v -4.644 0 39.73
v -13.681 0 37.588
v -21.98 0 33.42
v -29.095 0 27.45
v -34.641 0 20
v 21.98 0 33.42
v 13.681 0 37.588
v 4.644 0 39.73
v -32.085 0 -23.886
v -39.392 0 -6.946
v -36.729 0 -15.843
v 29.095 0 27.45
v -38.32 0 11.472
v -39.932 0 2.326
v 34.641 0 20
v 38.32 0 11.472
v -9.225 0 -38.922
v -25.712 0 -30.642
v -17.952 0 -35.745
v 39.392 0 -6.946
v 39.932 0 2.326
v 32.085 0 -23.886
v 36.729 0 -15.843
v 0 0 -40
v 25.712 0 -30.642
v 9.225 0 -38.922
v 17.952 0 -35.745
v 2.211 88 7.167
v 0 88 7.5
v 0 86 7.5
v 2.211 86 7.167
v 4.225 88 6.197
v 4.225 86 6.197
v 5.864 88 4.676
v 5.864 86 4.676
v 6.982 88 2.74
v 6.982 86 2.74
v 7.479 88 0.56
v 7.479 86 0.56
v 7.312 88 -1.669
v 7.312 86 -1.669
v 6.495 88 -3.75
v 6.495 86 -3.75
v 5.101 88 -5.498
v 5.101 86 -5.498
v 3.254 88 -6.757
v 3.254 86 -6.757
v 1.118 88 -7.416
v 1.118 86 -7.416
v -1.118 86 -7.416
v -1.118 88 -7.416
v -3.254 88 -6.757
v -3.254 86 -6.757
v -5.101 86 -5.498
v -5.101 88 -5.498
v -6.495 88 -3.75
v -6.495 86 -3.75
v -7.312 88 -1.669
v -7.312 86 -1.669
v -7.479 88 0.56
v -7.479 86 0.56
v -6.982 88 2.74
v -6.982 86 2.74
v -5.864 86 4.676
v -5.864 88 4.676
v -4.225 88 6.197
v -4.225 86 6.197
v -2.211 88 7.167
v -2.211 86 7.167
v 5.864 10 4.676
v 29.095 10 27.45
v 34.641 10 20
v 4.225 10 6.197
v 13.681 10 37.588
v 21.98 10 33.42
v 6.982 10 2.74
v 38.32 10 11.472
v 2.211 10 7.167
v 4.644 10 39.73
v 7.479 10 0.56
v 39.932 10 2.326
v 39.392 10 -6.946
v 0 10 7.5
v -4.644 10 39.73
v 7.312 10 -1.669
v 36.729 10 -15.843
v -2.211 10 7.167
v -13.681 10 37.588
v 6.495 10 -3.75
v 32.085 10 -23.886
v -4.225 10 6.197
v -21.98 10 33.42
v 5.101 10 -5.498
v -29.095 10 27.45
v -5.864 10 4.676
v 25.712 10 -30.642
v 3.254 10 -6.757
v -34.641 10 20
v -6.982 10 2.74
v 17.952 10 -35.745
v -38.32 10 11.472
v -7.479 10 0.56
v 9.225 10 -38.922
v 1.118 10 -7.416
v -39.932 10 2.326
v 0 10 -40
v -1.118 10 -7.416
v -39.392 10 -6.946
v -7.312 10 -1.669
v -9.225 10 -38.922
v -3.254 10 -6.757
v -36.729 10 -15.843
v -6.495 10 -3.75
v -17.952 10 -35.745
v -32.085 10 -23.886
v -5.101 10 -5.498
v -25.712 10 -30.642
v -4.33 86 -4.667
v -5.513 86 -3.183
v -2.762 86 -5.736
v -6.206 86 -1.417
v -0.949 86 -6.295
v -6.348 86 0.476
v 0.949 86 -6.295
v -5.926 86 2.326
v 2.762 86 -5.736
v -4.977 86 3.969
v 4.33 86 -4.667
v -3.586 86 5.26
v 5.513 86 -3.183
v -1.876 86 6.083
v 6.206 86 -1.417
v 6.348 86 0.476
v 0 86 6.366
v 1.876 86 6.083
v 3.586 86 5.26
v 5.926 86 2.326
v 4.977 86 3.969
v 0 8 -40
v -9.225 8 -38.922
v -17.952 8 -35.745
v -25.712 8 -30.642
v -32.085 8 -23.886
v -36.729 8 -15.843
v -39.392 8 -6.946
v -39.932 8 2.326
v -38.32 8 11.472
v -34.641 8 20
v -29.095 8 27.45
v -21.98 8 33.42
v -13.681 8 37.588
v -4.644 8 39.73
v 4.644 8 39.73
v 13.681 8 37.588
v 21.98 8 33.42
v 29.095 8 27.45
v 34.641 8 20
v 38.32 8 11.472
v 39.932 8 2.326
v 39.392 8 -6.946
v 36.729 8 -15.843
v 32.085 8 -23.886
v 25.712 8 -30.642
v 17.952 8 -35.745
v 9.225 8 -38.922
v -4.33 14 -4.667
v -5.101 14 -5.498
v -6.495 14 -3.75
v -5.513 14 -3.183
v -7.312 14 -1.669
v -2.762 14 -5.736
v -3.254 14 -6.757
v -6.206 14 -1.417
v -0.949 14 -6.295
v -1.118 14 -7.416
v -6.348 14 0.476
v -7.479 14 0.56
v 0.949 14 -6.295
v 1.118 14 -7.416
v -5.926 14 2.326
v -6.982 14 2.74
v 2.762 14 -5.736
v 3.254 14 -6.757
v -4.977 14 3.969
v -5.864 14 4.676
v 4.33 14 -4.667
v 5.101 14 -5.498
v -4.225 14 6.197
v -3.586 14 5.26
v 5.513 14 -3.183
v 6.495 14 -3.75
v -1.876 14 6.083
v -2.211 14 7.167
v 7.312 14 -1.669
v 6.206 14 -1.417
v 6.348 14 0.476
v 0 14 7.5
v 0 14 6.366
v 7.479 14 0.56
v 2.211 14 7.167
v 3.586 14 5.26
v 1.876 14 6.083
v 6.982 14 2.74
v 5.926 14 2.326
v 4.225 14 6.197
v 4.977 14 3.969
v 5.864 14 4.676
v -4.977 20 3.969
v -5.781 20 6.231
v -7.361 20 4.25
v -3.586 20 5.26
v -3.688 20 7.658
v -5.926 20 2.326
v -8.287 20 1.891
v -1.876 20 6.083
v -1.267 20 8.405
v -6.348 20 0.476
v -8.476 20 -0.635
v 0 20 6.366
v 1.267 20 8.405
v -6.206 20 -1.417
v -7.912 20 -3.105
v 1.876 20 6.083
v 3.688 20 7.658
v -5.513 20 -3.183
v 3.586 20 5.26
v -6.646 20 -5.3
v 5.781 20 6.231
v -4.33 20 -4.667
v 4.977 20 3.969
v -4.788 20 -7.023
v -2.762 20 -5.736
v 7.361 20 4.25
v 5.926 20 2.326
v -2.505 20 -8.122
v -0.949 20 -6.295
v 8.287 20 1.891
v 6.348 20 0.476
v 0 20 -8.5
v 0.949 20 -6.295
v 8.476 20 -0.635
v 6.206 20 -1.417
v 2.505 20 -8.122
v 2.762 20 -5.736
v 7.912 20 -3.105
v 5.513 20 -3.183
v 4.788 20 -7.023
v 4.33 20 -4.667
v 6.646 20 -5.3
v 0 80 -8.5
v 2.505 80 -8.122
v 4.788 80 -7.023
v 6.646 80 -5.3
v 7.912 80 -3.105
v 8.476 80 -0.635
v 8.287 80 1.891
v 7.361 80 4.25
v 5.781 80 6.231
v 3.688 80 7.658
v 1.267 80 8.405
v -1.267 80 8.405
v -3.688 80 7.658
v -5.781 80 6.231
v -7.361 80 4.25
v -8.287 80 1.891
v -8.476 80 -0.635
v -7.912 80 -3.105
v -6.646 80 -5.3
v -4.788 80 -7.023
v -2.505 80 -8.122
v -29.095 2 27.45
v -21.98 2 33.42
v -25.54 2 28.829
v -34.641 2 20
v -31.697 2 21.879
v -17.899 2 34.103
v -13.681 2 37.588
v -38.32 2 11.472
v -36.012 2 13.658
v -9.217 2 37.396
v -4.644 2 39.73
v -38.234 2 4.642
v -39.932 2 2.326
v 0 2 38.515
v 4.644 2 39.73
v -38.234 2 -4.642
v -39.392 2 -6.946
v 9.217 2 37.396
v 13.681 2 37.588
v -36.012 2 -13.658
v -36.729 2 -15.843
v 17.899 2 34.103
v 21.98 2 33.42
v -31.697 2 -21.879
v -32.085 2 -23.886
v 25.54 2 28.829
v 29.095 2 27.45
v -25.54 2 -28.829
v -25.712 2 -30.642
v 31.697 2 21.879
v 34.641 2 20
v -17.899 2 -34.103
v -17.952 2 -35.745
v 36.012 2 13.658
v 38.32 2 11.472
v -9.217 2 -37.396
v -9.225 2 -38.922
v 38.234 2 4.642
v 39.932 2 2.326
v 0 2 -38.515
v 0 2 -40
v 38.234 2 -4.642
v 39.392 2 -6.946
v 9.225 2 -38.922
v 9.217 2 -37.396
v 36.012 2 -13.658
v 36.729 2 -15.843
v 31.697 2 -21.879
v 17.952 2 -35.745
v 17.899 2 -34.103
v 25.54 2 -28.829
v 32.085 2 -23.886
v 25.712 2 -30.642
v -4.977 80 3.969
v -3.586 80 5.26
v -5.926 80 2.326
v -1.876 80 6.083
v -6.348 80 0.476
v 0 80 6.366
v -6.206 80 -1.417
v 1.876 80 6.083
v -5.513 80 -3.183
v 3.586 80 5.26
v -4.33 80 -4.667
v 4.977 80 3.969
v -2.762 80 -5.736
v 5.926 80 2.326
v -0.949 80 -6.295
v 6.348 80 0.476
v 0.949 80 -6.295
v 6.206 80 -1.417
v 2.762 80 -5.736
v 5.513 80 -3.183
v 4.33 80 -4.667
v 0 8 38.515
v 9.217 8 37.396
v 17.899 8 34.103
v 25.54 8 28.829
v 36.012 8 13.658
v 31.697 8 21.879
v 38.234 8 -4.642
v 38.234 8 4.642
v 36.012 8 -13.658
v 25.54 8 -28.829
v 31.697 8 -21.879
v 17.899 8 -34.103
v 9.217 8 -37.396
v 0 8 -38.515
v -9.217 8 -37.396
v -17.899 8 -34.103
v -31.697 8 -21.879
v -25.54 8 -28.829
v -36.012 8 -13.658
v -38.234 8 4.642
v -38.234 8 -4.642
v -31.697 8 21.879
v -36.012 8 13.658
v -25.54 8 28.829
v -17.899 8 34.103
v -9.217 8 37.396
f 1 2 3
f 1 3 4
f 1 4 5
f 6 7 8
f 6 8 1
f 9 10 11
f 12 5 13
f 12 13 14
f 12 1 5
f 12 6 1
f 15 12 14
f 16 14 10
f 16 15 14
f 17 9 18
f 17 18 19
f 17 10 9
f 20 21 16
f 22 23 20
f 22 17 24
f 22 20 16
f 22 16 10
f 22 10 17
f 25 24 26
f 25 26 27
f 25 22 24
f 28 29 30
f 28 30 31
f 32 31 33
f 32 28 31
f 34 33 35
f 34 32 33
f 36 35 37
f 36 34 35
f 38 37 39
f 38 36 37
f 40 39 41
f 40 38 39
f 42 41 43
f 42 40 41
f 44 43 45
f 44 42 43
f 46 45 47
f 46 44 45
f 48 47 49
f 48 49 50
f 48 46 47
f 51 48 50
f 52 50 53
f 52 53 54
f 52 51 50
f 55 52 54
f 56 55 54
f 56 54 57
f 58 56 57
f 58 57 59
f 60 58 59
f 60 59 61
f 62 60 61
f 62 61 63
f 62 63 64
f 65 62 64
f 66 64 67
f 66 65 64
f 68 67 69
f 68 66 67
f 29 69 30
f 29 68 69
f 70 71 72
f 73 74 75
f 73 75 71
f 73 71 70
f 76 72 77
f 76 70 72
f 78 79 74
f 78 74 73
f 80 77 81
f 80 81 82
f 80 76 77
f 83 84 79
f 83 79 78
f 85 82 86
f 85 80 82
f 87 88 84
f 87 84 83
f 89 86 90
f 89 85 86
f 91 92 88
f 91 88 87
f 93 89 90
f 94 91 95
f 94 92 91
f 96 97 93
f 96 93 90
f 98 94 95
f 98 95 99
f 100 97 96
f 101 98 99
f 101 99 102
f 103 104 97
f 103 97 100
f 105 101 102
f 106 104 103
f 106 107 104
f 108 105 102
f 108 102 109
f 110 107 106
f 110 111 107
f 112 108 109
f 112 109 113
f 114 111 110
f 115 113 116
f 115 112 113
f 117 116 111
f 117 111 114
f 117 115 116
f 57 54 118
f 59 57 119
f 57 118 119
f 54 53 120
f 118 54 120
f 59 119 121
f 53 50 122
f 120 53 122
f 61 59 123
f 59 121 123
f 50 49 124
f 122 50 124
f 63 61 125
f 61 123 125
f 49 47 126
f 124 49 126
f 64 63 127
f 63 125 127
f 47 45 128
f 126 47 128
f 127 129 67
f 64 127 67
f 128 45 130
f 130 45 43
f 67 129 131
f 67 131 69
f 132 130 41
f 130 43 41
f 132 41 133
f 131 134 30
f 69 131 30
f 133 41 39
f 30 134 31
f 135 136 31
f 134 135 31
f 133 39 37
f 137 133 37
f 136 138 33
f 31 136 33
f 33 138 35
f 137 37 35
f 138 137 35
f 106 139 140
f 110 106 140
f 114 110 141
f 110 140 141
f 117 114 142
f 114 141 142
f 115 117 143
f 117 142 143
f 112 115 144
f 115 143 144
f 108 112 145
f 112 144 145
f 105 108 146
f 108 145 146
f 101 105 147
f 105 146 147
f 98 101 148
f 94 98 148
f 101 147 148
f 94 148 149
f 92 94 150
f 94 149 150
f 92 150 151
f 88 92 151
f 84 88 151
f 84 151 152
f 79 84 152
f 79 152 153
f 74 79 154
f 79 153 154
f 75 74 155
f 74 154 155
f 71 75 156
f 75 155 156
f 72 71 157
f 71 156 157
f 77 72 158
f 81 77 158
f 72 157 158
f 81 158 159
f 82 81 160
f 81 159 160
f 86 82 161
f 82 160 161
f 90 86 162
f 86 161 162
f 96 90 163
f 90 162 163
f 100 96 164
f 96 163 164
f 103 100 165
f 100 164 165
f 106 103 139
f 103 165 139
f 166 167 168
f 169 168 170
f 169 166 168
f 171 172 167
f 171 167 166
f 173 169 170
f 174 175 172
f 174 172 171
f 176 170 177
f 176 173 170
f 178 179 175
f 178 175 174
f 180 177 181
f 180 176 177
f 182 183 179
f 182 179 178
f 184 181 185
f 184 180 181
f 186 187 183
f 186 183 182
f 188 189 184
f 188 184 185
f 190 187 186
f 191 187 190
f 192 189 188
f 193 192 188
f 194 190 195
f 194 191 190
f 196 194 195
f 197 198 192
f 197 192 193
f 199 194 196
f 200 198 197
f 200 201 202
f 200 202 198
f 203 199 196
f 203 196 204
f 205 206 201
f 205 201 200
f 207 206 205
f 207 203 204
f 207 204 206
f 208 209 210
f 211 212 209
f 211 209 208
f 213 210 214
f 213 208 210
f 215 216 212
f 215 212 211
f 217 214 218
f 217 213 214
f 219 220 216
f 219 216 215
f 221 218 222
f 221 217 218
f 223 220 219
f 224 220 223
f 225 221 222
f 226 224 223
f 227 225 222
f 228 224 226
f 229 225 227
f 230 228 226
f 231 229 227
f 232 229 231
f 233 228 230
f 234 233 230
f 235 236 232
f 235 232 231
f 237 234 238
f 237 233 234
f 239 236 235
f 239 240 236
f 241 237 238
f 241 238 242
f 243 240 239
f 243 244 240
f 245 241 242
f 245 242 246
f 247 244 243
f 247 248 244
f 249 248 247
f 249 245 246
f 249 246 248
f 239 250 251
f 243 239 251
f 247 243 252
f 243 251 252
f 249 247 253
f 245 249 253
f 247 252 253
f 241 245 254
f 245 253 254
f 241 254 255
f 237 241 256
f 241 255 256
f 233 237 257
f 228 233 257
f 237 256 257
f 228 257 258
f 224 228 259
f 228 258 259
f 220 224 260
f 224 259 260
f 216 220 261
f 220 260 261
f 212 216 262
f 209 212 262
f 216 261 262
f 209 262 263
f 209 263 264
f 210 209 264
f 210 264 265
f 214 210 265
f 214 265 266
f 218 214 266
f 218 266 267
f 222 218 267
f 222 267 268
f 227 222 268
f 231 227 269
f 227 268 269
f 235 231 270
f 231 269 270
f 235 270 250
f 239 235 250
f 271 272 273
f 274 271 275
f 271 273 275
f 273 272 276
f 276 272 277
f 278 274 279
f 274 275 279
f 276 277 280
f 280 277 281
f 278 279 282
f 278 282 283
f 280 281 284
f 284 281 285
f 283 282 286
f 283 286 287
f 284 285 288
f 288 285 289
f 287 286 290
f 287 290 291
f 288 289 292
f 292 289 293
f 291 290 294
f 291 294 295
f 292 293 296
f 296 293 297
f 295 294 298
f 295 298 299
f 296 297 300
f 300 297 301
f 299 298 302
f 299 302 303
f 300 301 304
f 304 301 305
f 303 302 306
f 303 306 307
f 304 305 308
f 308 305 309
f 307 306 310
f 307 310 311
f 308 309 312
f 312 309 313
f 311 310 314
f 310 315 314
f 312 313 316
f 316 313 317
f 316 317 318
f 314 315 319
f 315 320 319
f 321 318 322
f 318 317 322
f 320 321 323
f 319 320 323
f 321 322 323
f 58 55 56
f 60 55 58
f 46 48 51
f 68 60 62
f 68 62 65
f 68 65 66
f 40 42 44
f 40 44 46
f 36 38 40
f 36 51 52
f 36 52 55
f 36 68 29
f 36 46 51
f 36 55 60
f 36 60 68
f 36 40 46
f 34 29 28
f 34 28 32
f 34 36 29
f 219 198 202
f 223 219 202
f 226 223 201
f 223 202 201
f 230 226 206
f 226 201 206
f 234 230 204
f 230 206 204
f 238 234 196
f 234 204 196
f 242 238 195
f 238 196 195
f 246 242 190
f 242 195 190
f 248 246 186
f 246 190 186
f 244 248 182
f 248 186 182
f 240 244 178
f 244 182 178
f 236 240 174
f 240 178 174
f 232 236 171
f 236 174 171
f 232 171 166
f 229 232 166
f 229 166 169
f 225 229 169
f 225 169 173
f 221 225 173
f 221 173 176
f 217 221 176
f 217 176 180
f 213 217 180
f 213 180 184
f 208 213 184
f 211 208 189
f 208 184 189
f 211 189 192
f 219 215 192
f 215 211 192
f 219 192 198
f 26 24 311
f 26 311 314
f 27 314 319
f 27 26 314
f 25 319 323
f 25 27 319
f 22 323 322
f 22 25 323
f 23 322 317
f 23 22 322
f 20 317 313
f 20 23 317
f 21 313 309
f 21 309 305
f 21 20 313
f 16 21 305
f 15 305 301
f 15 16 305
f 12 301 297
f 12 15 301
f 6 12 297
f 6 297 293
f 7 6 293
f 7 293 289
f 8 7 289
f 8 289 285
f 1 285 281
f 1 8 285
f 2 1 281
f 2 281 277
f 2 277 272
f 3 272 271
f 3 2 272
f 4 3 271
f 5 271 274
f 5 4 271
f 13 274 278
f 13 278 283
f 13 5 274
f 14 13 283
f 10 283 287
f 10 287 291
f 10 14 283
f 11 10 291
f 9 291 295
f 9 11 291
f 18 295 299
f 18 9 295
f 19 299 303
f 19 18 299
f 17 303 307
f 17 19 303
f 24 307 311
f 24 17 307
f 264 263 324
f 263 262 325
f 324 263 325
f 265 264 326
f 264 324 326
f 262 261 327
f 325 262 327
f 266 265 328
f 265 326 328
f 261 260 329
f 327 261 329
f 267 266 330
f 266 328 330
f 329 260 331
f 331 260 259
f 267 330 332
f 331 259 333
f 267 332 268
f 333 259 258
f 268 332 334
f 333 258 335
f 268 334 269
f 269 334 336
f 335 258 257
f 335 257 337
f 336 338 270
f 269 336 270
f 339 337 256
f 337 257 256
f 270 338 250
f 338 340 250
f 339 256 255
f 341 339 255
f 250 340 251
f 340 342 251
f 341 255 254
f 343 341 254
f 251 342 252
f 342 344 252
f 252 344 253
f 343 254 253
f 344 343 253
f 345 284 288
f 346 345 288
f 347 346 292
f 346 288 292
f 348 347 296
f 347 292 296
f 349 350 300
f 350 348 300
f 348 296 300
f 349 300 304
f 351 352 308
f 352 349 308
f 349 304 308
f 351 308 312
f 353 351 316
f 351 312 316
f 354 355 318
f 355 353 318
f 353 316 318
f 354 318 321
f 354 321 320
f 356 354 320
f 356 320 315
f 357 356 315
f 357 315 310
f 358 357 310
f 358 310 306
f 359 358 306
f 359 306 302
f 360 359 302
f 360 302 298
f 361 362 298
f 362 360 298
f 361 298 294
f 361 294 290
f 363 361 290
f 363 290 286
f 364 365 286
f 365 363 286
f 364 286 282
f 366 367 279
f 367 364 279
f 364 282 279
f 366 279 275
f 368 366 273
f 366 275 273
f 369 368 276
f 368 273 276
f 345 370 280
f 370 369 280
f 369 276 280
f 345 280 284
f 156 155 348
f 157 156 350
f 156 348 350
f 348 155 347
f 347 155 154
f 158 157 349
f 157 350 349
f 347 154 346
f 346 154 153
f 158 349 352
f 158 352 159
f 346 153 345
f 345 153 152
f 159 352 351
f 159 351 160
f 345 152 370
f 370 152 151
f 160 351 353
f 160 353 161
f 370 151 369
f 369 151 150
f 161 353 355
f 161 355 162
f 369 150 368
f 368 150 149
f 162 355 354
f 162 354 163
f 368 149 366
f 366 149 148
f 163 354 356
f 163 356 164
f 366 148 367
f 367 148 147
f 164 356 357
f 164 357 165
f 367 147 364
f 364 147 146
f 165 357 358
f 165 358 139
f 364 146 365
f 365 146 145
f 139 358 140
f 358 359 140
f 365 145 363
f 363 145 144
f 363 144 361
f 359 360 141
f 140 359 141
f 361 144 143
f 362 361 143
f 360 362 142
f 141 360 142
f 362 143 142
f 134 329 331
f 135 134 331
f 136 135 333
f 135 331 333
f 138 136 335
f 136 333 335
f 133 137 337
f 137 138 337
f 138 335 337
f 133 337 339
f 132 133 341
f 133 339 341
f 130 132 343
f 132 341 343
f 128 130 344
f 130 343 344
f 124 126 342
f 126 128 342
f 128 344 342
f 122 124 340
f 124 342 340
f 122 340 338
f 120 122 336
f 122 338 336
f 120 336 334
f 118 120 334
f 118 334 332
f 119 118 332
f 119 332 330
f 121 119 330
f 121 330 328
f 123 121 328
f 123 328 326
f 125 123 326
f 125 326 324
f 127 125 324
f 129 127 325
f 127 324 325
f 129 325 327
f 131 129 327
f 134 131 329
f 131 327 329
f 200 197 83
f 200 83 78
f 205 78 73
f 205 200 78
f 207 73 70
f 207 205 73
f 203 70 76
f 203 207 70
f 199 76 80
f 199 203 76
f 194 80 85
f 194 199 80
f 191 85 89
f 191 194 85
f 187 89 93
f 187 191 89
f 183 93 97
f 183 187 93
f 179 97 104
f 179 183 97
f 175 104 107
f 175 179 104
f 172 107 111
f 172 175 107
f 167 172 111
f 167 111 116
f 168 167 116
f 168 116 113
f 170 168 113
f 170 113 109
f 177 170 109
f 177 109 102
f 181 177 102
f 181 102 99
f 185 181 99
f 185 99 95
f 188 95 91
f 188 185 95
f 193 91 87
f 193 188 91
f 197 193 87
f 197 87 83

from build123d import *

# Parameters (mm, degrees)
SKETCH1_R           = 38.515
BOSS_EXTRUDE1_DEPTH = 10
SKETCH2_R           = 40
BOSS_EXTRUDE2_DEPTH = 2
BOSS_EXTRUDE3_START = -2
SKETCH3_R           = 40
BOSS_EXTRUDE3_DEPTH = 2
SKETCH4_R           = 6.366
BOSS_EXTRUDE4_DEPTH = 78
SKETCH5_R           = 7.5
BOSS_EXTRUDE5_DEPTH = 2
SKETCH6_R           = 8.5
BOSS_EXTRUDE6_DEPTH = 60
BOSS_EXTRUDE7_START = 4
SKETCH7_R           = 7.5
BOSS_EXTRUDE7_DEPTH = 4


with BuildPart() as part:
    # Sketch1 → Boss-Extrude1 (new body)
    with BuildSketch(Plane(origin=(0, 0, 0), x_dir=(1, 0, 0), z_dir=(0, 1, 0))):
        with Locations(Location((0, 0, 0), (0, 0, 270))):
            Circle(SKETCH1_R)
    extrude(amount=BOSS_EXTRUDE1_DEPTH)

    # Sketch2 → Boss-Extrude2 (add)
    with BuildSketch(Plane.XZ):
        with Locations(Location((0, 0, 0), (0, 0, 270))):
            Circle(SKETCH2_R)
    extrude(amount=-BOSS_EXTRUDE2_DEPTH)

    # Sketch3 → Boss-Extrude3 (add)
    with BuildSketch(Plane(origin=(0, 10, 0), x_dir=(1, 0, 0), z_dir=(0, 1, 0)).offset(BOSS_EXTRUDE3_START)):
        with Locations(Location((0, 0, 0), (0, 0, 90))):
            Circle(SKETCH3_R)
    extrude(amount=BOSS_EXTRUDE3_DEPTH)

    # Sketch4 → Boss-Extrude4 (add)
    with BuildSketch(Plane(origin=(0, 10, 0), x_dir=(1, 0, 0), z_dir=(0, 1, 0))):
        with Locations(Location((0, 0, 0), (0, 0, 270))):
            Circle(SKETCH4_R)
    extrude(amount=BOSS_EXTRUDE4_DEPTH)

    # Sketch5 → Boss-Extrude5 (add)
    with BuildSketch(Plane(origin=(0, 88, 0), x_dir=(1, 0, 0), z_dir=(0, 1, 0))):
        with Locations(Location((0, 0, 0), (0, 0, 270))):
            Circle(SKETCH5_R)
    extrude(amount=-BOSS_EXTRUDE5_DEPTH)

    # Sketch6 → Boss-Extrude6 (add)
    with BuildSketch(Plane(origin=(0, 80, 0), x_dir=(-1, 0, 0), z_dir=(0, -1, 0))):
        with Locations(Location((0, 0, 0), (0, 0, 90))):
            Circle(SKETCH6_R)
    extrude(amount=BOSS_EXTRUDE6_DEPTH)

    # Sketch7 → Boss-Extrude7 (add)
    with BuildSketch(Plane(origin=(0, 10, 0), x_dir=(1, 0, 0), z_dir=(0, 1, 0)).offset(BOSS_EXTRUDE7_START)):
        with Locations(Location((0, 0, 0), (0, 0, 270))):
            Circle(SKETCH7_R)
    extrude(amount=-BOSS_EXTRUDE7_DEPTH)


solid = part.part
